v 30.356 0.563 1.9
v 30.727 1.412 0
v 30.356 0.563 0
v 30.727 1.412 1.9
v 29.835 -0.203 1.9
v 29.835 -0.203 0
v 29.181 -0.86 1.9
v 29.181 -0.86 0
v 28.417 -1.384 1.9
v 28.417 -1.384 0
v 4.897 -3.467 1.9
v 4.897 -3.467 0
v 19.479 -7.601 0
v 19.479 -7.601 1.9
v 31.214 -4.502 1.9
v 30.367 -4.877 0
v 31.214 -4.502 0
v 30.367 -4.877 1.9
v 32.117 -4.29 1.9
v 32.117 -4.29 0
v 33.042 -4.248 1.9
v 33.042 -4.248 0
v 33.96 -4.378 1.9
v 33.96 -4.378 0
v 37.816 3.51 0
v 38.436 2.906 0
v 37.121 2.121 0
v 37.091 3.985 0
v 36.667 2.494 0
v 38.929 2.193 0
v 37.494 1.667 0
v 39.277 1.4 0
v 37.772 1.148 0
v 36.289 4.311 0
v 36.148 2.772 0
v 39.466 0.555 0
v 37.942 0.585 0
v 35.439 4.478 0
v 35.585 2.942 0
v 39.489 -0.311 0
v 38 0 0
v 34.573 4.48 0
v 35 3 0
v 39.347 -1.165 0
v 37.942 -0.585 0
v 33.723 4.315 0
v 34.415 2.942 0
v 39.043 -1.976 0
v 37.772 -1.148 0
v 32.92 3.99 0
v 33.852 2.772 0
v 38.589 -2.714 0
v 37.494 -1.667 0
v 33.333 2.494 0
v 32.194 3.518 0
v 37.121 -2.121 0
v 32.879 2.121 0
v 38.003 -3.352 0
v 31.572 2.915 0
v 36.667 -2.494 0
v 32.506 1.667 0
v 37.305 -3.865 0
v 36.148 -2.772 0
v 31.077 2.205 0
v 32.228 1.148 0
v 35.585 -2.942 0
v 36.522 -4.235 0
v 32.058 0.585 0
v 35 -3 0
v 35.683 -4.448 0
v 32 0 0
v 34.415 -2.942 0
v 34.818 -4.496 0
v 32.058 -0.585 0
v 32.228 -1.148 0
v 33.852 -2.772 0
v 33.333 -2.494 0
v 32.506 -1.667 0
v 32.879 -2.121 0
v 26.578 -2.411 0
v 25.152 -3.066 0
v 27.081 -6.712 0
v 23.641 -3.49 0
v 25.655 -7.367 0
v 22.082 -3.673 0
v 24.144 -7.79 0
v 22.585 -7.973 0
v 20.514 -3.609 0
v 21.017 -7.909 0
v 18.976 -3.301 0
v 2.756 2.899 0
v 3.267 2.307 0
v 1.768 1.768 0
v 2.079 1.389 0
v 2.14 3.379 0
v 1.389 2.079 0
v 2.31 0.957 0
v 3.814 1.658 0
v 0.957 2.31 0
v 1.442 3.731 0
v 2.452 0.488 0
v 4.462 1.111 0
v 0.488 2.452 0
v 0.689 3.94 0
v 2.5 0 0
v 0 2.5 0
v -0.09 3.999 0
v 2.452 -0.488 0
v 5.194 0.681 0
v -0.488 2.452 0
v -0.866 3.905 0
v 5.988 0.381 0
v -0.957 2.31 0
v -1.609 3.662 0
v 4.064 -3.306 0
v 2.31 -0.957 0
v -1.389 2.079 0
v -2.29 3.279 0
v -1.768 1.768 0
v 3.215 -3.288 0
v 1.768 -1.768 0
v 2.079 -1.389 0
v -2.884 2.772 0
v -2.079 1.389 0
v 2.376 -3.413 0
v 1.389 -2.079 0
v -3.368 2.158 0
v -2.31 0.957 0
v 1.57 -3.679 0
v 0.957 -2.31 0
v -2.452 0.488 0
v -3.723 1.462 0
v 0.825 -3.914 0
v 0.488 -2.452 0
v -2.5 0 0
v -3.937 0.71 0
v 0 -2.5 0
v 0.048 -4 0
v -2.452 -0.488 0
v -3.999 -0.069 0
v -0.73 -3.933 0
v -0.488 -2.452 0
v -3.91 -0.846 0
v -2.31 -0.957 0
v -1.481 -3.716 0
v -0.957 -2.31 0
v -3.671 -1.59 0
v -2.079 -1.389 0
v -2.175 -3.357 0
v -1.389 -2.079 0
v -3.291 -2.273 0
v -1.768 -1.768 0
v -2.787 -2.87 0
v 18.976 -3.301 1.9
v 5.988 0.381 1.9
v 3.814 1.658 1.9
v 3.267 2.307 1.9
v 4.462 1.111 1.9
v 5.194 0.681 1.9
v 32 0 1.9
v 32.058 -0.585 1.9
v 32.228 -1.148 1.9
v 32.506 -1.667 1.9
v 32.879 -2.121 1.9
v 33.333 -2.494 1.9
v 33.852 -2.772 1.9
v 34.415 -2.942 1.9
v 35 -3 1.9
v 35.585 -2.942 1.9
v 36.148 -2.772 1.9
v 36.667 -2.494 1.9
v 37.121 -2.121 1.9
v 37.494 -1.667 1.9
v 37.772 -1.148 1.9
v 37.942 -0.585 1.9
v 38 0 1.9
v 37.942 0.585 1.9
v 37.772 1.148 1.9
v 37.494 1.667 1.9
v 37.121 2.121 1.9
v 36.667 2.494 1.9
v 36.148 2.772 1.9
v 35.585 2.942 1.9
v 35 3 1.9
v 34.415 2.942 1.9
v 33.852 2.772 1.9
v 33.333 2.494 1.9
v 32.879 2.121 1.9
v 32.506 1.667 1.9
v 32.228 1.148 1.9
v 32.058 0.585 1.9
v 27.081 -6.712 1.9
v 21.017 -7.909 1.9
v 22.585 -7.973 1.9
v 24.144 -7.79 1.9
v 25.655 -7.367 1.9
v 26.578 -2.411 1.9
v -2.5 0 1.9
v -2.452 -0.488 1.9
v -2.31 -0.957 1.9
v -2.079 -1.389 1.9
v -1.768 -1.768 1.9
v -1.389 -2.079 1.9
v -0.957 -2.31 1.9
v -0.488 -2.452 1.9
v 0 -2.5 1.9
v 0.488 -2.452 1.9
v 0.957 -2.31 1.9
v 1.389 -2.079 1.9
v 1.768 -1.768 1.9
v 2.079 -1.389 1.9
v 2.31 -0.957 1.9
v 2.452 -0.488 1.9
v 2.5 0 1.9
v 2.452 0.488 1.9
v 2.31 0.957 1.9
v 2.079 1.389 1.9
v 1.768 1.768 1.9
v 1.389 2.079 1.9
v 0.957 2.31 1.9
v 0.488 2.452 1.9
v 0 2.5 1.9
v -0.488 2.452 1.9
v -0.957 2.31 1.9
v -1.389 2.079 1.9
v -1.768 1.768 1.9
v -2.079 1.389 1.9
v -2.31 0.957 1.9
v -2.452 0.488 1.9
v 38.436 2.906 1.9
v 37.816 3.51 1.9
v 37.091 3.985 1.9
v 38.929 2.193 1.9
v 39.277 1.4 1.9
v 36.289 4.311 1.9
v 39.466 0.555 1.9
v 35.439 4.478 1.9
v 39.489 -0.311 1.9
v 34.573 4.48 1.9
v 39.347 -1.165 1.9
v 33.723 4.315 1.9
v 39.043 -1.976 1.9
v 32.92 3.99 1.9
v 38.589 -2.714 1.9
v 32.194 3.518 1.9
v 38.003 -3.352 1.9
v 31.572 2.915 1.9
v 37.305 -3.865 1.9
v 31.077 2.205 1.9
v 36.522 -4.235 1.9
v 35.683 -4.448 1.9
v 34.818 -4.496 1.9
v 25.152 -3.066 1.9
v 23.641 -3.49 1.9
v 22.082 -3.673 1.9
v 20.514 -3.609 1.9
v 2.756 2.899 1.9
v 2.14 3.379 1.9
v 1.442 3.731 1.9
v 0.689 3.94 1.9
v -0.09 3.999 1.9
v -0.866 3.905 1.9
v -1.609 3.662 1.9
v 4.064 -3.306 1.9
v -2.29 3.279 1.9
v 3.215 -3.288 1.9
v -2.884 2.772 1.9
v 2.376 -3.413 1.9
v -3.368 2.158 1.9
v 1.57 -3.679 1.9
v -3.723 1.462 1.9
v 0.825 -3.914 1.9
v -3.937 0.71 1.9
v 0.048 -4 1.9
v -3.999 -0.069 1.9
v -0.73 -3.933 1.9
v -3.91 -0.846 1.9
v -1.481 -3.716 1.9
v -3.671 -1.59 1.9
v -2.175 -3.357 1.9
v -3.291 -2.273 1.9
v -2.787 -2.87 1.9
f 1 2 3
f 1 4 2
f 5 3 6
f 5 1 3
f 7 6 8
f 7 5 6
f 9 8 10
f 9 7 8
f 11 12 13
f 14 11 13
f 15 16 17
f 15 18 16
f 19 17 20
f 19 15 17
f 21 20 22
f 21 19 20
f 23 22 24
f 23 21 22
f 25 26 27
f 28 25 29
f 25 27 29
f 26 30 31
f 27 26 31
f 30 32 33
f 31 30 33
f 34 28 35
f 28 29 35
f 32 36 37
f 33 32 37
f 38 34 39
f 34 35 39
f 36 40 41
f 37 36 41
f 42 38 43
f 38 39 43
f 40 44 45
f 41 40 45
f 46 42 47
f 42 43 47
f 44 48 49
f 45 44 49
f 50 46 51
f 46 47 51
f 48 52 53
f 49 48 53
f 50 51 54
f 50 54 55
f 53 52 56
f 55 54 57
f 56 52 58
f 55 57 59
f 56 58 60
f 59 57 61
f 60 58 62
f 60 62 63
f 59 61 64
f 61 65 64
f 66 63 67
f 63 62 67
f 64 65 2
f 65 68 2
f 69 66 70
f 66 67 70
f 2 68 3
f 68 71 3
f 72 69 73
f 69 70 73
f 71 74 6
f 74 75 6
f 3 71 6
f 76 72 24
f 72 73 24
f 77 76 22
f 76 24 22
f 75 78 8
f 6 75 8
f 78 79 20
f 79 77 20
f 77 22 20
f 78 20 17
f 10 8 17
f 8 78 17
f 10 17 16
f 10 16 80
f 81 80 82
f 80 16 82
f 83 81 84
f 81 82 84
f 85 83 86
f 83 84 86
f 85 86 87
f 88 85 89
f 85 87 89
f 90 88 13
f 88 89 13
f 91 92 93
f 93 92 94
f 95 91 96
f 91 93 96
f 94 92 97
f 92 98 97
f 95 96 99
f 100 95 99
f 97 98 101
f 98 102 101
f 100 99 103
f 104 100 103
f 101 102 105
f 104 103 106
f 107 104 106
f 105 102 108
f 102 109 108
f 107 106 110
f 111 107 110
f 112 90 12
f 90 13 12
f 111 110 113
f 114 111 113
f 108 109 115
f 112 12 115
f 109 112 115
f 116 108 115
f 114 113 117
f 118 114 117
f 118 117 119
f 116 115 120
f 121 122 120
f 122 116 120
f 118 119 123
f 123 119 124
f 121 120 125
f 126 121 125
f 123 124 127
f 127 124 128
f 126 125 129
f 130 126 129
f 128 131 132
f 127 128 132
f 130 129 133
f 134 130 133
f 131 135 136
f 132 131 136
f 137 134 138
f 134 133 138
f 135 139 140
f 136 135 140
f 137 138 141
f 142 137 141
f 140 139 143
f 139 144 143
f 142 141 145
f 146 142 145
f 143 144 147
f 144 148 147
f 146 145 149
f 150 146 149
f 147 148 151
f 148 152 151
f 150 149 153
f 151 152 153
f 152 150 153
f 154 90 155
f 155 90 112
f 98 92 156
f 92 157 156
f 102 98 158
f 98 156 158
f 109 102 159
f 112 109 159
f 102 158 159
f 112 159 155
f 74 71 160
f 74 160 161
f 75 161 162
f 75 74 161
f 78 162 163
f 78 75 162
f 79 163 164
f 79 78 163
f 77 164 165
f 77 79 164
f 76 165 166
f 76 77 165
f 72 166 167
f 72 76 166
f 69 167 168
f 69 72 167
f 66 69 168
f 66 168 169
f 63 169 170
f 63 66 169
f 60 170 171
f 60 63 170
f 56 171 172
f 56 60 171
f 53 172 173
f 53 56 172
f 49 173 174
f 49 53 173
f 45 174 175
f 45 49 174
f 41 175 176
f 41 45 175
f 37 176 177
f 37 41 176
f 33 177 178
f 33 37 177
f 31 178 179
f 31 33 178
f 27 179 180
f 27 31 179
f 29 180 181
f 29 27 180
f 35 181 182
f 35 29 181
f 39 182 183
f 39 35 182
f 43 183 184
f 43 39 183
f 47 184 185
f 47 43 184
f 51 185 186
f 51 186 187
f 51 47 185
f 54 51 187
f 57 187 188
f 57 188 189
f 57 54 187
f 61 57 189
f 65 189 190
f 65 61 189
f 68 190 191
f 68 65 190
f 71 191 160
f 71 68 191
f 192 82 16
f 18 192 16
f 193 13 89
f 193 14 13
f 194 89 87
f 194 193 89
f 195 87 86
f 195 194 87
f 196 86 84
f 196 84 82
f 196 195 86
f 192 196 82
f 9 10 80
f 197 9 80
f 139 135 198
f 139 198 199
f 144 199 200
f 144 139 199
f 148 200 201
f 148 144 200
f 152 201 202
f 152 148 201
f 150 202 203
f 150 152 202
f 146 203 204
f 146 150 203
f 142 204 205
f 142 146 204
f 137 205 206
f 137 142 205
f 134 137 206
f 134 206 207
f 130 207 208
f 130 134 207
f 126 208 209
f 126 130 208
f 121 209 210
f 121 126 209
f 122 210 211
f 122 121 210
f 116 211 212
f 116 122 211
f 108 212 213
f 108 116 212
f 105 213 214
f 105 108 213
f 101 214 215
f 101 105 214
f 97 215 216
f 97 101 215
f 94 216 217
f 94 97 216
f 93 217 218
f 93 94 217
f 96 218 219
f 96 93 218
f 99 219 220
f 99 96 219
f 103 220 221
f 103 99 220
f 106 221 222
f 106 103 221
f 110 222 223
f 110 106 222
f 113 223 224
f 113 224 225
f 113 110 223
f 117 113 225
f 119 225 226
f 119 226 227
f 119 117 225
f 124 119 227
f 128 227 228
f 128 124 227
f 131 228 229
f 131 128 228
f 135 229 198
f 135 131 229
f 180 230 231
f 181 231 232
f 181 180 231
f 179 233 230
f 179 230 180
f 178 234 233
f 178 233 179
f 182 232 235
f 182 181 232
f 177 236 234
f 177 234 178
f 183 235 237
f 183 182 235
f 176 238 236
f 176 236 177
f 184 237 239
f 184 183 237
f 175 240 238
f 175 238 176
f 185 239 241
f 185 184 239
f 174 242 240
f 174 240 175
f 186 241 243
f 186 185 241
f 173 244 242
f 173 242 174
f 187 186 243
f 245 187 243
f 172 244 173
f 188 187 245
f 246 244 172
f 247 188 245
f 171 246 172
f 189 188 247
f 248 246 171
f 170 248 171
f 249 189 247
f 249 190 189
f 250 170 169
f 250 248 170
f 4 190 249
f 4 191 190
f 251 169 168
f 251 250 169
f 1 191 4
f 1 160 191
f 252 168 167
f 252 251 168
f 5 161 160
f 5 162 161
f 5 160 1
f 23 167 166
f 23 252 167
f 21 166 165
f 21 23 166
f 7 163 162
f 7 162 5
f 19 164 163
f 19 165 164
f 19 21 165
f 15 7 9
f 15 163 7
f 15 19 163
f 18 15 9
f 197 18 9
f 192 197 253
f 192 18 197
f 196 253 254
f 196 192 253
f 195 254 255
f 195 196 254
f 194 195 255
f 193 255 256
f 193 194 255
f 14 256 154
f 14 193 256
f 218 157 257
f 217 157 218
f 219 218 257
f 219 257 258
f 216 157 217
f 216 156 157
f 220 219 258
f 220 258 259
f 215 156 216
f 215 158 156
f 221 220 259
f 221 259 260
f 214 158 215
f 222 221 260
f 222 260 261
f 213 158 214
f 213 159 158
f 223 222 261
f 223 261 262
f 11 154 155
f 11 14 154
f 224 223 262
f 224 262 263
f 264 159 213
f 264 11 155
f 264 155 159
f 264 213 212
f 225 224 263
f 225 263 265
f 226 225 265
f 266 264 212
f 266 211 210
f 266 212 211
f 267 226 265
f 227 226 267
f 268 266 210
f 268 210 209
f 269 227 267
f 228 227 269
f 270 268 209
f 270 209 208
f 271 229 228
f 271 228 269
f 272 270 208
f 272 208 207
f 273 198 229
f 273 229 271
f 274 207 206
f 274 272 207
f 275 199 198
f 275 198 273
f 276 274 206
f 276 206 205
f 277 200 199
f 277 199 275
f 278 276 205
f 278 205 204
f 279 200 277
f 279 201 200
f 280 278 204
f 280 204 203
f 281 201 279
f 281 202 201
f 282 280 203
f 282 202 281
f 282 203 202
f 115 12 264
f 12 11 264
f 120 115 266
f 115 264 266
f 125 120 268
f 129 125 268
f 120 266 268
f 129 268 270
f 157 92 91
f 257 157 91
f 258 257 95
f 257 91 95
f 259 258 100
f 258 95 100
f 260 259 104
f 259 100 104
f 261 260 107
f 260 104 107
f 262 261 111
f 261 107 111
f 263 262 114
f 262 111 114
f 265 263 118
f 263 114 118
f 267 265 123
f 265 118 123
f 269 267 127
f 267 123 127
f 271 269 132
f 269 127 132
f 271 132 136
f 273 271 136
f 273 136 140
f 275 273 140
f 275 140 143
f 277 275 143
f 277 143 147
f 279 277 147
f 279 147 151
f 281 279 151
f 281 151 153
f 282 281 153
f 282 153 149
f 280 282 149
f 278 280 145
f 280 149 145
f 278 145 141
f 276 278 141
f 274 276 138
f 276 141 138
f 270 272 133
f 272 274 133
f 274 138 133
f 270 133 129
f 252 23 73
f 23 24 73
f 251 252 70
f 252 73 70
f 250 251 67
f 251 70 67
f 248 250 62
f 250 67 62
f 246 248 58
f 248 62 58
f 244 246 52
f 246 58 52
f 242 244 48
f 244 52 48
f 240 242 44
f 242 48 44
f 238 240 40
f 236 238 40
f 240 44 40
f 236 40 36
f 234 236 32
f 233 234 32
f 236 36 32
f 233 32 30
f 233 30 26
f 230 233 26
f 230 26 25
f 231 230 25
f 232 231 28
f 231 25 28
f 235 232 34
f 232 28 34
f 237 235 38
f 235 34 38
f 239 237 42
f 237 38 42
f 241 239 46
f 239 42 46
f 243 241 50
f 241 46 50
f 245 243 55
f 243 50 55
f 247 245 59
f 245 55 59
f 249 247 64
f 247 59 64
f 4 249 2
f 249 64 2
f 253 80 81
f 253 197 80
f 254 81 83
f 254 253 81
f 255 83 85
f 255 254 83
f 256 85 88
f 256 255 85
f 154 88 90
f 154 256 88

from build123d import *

# Parameters (mm, degrees)
SKETCH_1_R        = 4.5
SKETCH_1_R_2      = 3
EXTRUDE_1_DEPTH   = 1.9
SKETCH_1_R_3      = 4
SKETCH_1_R_4      = 2.5
EXTRUDE_1_2_DEPTH = 1.9
EXTRUDE_START     = -1.9
EXTRUDE_2_DEPTH   = 1.9
FILLET_1_R        = 10
FILLET_2_R        = 5


with BuildPart() as part:
    # ｽｹｯﾁ1 → ﾎﾞｽ - 押し出し1 (new body)
    with BuildSketch(Plane.XY):
        with Locations(Location((35, 0, 0), (0, 0, 180))):
            Circle(SKETCH_1_R)
        with Locations(Location((35, 0, 0), (0, 0, 180))):
            Circle(SKETCH_1_R_2, mode=Mode.SUBTRACT)
    extrude(amount=EXTRUDE_1_DEPTH)



with BuildPart() as body_2:
    # ｽｹｯﾁ1 → Extrude 1 2 (new body)
    with BuildSketch(Plane.XY):
        with Locations(Location((0, 0, 0), (0, 0, 180))):
            Circle(SKETCH_1_R_3)
        with Locations(Location((0, 0, 0), (0, 0, 180))):
            Circle(SKETCH_1_R_4, mode=Mode.SUBTRACT)
    extrude(amount=EXTRUDE_1_2_DEPTH)


with BuildPart() as part_1:
    add(part.part)

    add(body_2.part)  # ﾎﾞｽ - 押し出し2 merges body 2
    # ｽｹｯﾁ3 → ﾎﾞｽ - 押し出し2 (add)
    with BuildSketch(Plane.XY.offset(1.9).offset(EXTRUDE_START)):
        with BuildLine():
            Line((30.505314037, -0.218627753), (22.960861135, -4.430337969))
            Line((22.960861135, -4.430337969), (3.878251034, 0.979371696))
            ThreePointArc((3.878251034, 0.979371696), (3.848349766, -1.090964748), (2.787286286, -2.868978069))
            Line((2.787286286, -2.868978069), (23.463935052, -8.730580129))
            Line((23.463935052, -8.730580129), (32.455079681, -3.71125054))
            ThreePointArc((32.455079681, -3.71125054), (31.070799365, -2.19348635), (30.505314037, -0.218627753))
        make_face()
    extrude(amount=EXTRUDE_2_DEPTH)

    # ﾌｨﾚｯﾄ1
    fillet_1_edges = [part_1.edges().sort_by_distance(p)[0] for p in [
        (22.960861135, -4.430337969, 0.95),
        (23.463935052, -8.730580129, 0.95),
    ]]
    fillet(fillet_1_edges, radius=FILLET_1_R)

    # ﾌｨﾚｯﾄ2
    fillet_2_edges = [part_1.edges().sort_by_distance(p)[0] for p in [
        (3.878251034, 0.979371696, 0.95),
        (30.505314037, -0.218627753, 0.95),
        (32.455079681, -3.71125054, 0.95),
        (2.787286286, -2.868978069, 0.95),
    ]]
    fillet(fillet_2_edges, radius=FILLET_2_R)


solid = part_1.part
